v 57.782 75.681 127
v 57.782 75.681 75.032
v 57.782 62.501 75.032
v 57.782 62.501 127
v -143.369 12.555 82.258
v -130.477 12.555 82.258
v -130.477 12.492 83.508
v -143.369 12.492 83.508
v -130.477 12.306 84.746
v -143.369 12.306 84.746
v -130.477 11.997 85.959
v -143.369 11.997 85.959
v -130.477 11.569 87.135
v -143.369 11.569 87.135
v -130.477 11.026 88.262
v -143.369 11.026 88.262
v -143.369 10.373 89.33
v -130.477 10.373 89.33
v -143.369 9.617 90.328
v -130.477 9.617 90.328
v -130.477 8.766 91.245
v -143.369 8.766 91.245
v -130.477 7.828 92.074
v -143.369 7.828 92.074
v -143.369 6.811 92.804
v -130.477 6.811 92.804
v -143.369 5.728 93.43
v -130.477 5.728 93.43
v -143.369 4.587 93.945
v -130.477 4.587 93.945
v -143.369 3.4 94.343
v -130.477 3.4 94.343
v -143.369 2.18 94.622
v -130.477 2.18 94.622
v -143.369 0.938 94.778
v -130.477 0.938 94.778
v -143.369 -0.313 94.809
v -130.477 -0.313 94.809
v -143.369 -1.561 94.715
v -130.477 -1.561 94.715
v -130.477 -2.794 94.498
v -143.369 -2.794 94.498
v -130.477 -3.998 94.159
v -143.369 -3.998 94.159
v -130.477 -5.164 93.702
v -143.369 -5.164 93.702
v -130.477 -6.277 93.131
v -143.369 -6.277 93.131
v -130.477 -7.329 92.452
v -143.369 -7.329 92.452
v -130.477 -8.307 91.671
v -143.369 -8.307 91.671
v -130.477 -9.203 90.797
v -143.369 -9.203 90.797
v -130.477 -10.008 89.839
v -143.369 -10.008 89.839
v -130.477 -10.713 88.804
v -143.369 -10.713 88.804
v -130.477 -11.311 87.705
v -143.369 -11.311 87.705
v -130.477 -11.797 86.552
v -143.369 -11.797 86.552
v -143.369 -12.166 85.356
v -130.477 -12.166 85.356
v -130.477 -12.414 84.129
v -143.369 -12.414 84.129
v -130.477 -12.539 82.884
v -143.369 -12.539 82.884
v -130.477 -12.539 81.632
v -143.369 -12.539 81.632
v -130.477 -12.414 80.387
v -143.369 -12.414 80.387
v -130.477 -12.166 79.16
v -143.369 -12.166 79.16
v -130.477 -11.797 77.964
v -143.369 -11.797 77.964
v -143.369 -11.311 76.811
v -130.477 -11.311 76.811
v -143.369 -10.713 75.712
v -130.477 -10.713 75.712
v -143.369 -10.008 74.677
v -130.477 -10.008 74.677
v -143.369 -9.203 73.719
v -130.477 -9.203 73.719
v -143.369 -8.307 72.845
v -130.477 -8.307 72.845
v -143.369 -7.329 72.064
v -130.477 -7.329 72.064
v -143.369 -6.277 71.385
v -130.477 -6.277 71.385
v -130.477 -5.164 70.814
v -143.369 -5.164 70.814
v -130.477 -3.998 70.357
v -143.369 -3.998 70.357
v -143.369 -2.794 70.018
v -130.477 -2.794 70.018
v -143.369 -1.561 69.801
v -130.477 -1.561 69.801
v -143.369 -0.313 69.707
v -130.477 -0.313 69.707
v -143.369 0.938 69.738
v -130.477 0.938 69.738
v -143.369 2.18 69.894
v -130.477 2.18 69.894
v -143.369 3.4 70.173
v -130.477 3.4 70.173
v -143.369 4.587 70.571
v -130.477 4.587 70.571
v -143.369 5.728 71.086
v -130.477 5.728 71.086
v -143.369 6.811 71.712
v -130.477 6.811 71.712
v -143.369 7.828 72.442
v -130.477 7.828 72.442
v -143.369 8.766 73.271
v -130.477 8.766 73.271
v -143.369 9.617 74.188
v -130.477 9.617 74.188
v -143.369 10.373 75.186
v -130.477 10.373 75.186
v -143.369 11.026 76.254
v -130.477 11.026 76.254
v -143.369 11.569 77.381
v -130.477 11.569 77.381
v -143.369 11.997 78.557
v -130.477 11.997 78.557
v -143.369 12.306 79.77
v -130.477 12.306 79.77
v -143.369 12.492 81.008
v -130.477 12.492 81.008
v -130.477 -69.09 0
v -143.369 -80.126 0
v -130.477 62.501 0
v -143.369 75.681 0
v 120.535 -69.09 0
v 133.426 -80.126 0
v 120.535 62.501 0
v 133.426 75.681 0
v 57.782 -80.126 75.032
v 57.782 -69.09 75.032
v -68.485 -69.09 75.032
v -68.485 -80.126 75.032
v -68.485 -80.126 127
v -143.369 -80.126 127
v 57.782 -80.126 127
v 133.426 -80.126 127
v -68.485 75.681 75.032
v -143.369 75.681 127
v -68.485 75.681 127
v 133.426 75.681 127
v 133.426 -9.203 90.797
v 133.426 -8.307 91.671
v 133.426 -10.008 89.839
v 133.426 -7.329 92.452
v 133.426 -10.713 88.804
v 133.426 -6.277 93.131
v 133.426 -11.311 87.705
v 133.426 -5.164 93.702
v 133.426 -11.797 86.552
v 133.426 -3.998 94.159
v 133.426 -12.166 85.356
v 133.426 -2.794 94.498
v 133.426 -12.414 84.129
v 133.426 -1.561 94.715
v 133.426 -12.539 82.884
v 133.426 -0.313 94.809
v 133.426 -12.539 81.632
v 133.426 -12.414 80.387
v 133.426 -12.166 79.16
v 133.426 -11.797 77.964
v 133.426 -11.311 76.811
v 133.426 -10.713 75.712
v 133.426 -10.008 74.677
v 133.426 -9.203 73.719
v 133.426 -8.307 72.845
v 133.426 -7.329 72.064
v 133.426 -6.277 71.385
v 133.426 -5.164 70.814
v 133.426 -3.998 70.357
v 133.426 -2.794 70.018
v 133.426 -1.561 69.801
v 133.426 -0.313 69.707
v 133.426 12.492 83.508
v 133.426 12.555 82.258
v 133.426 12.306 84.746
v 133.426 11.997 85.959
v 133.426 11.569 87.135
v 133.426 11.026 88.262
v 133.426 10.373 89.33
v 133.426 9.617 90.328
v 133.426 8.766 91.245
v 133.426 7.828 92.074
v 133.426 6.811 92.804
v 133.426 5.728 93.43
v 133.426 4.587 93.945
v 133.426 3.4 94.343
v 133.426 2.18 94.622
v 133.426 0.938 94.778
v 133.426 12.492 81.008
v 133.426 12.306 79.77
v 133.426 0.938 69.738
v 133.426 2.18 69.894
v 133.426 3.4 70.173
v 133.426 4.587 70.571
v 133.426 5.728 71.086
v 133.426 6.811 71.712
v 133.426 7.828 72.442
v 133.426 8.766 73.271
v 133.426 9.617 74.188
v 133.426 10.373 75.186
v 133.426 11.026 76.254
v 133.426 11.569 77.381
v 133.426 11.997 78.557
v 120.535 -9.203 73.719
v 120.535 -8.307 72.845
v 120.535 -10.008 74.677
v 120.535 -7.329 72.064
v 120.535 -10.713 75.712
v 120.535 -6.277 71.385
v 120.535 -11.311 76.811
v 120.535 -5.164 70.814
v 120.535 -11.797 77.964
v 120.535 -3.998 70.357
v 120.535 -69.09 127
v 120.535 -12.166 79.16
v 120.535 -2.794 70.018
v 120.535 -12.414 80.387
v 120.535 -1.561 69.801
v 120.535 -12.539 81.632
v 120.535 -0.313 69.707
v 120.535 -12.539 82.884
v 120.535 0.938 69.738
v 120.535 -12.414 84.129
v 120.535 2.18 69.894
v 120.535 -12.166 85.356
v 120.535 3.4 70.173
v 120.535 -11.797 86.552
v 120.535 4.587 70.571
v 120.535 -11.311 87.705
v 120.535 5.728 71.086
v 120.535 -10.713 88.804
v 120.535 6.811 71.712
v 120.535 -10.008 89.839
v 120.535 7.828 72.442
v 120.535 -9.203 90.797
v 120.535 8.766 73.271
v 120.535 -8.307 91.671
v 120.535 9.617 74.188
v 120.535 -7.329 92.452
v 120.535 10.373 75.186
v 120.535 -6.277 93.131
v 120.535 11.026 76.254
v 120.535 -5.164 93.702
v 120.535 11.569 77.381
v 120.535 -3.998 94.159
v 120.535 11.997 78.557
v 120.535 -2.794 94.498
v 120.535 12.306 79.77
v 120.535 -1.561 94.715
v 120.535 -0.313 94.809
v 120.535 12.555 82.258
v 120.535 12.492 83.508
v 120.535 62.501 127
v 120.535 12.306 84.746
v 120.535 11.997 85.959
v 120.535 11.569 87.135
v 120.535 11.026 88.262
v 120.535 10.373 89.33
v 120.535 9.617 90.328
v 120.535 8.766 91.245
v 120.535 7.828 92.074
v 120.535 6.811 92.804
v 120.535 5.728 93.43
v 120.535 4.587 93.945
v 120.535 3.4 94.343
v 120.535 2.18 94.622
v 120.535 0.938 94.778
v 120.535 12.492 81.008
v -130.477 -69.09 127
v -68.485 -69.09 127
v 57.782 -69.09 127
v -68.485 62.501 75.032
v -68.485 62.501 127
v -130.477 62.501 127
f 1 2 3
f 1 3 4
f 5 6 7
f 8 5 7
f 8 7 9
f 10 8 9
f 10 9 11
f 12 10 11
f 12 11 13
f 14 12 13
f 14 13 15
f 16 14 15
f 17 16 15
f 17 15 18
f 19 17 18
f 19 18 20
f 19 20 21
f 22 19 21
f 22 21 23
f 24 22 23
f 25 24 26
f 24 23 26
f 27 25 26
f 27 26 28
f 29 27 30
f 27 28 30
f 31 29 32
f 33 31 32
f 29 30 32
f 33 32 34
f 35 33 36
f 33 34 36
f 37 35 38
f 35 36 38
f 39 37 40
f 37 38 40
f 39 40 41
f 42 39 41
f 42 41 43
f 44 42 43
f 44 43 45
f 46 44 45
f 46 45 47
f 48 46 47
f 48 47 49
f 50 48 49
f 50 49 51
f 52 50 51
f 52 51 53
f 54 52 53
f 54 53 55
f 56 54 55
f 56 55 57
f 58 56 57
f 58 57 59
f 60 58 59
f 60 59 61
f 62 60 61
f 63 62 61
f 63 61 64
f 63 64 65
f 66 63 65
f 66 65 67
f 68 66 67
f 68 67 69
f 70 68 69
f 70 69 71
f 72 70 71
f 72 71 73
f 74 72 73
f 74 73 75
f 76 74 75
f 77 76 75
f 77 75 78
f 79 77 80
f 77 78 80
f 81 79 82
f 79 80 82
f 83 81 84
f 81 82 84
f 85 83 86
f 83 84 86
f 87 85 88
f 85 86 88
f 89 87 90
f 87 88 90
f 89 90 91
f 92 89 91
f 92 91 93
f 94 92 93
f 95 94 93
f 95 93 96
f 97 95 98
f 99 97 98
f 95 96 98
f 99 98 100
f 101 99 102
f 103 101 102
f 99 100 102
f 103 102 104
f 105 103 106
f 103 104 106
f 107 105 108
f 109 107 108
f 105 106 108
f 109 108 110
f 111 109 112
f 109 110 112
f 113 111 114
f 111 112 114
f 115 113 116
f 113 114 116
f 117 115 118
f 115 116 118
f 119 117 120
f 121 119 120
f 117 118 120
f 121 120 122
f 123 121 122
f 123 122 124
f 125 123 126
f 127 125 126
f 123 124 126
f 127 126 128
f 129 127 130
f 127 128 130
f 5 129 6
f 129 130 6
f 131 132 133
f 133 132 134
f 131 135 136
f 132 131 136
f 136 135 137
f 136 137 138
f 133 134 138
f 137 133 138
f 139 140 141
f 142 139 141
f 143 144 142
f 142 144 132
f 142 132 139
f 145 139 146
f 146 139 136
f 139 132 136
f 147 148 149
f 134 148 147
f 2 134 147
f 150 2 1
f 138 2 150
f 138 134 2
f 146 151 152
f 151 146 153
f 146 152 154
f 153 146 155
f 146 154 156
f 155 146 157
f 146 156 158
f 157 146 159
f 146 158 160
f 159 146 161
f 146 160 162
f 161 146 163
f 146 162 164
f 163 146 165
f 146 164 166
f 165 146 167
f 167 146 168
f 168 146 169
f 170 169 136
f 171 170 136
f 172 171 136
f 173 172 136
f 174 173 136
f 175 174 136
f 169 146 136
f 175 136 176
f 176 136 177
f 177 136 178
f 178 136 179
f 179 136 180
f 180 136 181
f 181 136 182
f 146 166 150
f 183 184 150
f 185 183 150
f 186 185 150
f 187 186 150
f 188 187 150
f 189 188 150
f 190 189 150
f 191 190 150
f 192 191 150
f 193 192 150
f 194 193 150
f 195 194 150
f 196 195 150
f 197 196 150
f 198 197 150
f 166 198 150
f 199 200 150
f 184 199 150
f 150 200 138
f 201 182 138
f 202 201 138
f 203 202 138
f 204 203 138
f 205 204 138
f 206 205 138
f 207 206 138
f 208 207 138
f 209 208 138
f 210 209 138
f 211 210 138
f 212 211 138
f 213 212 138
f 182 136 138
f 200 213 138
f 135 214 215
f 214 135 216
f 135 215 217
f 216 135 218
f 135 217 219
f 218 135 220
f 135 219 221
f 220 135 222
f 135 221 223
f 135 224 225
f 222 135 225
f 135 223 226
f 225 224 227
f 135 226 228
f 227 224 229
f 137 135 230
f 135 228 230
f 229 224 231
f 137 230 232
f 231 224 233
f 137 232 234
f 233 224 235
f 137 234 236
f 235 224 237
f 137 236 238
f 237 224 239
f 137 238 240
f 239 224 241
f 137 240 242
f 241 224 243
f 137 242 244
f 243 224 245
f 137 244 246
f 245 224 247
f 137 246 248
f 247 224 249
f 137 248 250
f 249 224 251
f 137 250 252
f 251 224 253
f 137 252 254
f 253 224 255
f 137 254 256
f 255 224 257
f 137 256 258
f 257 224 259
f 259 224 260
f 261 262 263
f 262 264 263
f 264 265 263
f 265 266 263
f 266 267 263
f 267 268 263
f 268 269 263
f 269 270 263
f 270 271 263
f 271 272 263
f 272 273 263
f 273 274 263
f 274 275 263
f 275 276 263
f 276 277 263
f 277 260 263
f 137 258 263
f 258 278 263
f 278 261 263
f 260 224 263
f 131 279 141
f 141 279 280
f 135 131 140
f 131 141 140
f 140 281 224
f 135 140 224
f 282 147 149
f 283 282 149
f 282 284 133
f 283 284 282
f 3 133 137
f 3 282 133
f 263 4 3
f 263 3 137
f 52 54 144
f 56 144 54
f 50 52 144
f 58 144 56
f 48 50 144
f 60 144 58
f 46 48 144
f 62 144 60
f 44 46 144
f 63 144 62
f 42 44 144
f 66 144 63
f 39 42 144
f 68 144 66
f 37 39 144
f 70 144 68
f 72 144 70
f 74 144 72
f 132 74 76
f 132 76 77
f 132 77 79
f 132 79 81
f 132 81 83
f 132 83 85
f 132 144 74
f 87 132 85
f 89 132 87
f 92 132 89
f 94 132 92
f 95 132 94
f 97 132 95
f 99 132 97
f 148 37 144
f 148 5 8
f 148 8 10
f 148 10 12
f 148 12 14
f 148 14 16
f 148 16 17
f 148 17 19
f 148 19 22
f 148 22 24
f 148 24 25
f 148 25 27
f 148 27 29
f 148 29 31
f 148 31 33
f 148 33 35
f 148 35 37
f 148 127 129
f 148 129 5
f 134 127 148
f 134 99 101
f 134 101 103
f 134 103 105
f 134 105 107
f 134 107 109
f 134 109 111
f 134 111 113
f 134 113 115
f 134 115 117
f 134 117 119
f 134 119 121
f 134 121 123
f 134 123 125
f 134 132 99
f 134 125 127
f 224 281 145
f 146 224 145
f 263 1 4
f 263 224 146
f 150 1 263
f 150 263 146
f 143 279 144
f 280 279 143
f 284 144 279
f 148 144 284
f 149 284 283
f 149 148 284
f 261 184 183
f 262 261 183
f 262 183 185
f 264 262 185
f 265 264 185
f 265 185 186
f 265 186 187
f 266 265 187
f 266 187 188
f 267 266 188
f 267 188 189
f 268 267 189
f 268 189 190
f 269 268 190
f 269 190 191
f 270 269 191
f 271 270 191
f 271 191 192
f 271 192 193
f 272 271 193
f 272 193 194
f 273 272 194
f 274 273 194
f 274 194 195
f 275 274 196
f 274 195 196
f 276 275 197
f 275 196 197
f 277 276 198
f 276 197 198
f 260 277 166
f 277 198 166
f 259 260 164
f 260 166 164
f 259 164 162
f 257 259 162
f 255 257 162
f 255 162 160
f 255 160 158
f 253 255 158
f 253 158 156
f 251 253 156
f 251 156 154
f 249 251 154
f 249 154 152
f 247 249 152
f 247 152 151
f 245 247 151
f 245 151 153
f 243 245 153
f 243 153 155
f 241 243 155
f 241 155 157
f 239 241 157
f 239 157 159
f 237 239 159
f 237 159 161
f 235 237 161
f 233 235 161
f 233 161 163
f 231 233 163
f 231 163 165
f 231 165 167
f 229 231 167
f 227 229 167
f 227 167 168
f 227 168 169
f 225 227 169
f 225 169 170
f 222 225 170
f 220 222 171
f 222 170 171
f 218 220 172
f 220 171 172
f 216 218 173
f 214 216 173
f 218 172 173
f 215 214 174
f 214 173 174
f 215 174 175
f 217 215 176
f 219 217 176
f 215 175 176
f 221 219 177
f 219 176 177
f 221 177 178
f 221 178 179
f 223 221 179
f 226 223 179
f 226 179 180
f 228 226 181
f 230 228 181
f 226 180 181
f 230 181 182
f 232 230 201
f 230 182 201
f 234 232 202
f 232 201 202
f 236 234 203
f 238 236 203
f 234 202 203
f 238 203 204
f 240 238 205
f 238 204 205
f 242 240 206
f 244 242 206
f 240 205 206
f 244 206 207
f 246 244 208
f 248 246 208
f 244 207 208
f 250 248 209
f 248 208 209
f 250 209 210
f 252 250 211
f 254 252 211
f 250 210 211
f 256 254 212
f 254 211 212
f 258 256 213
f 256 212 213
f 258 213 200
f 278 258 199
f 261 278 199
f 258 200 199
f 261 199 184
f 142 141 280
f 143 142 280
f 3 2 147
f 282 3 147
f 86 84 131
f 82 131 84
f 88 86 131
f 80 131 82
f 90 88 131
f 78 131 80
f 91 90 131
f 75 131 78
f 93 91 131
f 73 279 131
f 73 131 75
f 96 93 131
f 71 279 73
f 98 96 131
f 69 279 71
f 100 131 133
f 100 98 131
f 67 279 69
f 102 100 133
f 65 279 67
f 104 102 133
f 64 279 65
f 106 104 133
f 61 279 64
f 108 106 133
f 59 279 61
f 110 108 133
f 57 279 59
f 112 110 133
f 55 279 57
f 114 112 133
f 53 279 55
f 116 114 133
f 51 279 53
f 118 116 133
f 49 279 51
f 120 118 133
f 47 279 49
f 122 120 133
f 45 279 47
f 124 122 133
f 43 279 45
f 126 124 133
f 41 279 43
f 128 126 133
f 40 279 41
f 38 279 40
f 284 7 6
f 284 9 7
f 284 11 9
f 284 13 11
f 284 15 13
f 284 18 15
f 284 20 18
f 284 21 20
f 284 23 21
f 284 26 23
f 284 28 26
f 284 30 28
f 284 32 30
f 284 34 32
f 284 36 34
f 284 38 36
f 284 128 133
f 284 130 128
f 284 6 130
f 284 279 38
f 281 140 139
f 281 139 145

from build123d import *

# Parameters (mm, degrees)
F0_W      = 276.7956107855
F0_H      = 155.8074429631
F1_DEPTH  = 127
F2_R      = 12.5546361004
F3_DEPTH  = 276.7966107855
F4_W      = 126.266527921
F4_H      = 51.968123436
F5_DEPTH  = 155.8084429631
F6_W      = 251.0117739439
F6_H      = 131.5910294652
F7_DEPTH  = 75.032876564
F8_W      = 61.992302537
F8_H      = 58.8230818466
F9_DEPTH  = 51.969123436
F10_W     = 61.992302537
F10_H     = 52.2348090963
F11_DEPTH = 51.969123436
F12_W     = 62.752943486
F12_H     = 58.8230818466
F13_DEPTH = 51.969123436
F14_W     = 62.752943486
F14_H     = 52.2348090963
F15_DEPTH = 51.969123436
F16_W     = 61.992302537
F16_H     = 20.5331385223
F17_DEPTH = 127.001
F18_W     = 62.752943486
F18_H     = 20.5331385223
F19_DEPTH = 127.001


with BuildPart() as f1:
    # F0 (on Top) → F1 (new body)
    with BuildSketch(Plane.XY):
        with Locations((-4.9713328481, -2.2223033011)):
            Rectangle(F0_W, F0_H)
    extrude(amount=F1_DEPTH)

    # F2 (on face) → F3 (cut, through all)
    with BuildSketch(Plane.YZ.offset(133.4264725447)):
        with Locations((0, 82.2579711676)):
            Circle(F2_R)
    extrude(amount=-F3_DEPTH, mode=Mode.SUBTRACT)

    # F4 (on face) → F5 (cut, through all)
    with BuildSketch(Plane(origin=(0, 75.6814181805, 0), x_dir=(-1, 0, 0), z_dir=(0, 1, 0))):
        with Locations((5.3516533226, 101.015938282)):
            Rectangle(F4_W, F4_H)
    extrude(amount=-F5_DEPTH, mode=Mode.SUBTRACT)

    # F6 (on face) → F7 (cut, through all)
    with BuildSketch(Plane.XY.offset(75.031876564)):
        with Locations((-4.9713328481, -3.2941363752)):
            Rectangle(F6_W, F6_H)
    extrude(amount=-F7_DEPTH, mode=Mode.SUBTRACT)

    # F8 (on face) → F9 (cut, through all)
    with BuildSketch(Plane(origin=(0, 0, 75.031876564), x_dir=(1, 0, 0), z_dir=(0, 0, -1))):
        with Locations((-99.4810685515, 39.6781101845)):
            Rectangle(F8_W, F8_H)
    extrude(amount=-F9_DEPTH, mode=Mode.SUBTRACT)

    # F10 (on face) → F11 (cut, through all)
    with BuildSketch(Plane(origin=(0, 0, 75.031876564), x_dir=(1, 0, 0), z_dir=(0, 0, -1))):
        with Locations((-99.4810685515, -36.3839738093)):
            Rectangle(F10_W, F10_H)
    extrude(amount=-F11_DEPTH, mode=Mode.SUBTRACT)

    # F12 (on face) → F13 (cut, through all)
    with BuildSketch(Plane(origin=(0, 0, 75.031876564), x_dir=(1, 0, 0), z_dir=(0, 0, -1))):
        with Locations((89.1580823809, 39.6781101845)):
            Rectangle(F12_W, F12_H)
    extrude(amount=-F13_DEPTH, mode=Mode.SUBTRACT)

    # F14 (on face) → F15 (cut, through all)
    with BuildSketch(Plane(origin=(0, 0, 75.031876564), x_dir=(1, 0, 0), z_dir=(0, 0, -1))):
        with Locations((89.1580823809, -36.3839738093)):
            Rectangle(F14_W, F14_H)
    extrude(amount=-F15_DEPTH, mode=Mode.SUBTRACT)

    # F16 (on face) → F17 (cut, through all)
    with BuildSketch(Plane.XY.offset(127)):
        with Locations((-99.4810685515, 0)):
            Rectangle(F16_W, F16_H)
    extrude(amount=-F17_DEPTH, mode=Mode.SUBTRACT)

    # F18 (on face) → F19 (cut, through all)
    with BuildSketch(Plane.XY.offset(127)):
        with Locations((89.1580823809, 0)):
            Rectangle(F18_W, F18_H)
    extrude(amount=-F19_DEPTH, mode=Mode.SUBTRACT)


solid = f1.part
